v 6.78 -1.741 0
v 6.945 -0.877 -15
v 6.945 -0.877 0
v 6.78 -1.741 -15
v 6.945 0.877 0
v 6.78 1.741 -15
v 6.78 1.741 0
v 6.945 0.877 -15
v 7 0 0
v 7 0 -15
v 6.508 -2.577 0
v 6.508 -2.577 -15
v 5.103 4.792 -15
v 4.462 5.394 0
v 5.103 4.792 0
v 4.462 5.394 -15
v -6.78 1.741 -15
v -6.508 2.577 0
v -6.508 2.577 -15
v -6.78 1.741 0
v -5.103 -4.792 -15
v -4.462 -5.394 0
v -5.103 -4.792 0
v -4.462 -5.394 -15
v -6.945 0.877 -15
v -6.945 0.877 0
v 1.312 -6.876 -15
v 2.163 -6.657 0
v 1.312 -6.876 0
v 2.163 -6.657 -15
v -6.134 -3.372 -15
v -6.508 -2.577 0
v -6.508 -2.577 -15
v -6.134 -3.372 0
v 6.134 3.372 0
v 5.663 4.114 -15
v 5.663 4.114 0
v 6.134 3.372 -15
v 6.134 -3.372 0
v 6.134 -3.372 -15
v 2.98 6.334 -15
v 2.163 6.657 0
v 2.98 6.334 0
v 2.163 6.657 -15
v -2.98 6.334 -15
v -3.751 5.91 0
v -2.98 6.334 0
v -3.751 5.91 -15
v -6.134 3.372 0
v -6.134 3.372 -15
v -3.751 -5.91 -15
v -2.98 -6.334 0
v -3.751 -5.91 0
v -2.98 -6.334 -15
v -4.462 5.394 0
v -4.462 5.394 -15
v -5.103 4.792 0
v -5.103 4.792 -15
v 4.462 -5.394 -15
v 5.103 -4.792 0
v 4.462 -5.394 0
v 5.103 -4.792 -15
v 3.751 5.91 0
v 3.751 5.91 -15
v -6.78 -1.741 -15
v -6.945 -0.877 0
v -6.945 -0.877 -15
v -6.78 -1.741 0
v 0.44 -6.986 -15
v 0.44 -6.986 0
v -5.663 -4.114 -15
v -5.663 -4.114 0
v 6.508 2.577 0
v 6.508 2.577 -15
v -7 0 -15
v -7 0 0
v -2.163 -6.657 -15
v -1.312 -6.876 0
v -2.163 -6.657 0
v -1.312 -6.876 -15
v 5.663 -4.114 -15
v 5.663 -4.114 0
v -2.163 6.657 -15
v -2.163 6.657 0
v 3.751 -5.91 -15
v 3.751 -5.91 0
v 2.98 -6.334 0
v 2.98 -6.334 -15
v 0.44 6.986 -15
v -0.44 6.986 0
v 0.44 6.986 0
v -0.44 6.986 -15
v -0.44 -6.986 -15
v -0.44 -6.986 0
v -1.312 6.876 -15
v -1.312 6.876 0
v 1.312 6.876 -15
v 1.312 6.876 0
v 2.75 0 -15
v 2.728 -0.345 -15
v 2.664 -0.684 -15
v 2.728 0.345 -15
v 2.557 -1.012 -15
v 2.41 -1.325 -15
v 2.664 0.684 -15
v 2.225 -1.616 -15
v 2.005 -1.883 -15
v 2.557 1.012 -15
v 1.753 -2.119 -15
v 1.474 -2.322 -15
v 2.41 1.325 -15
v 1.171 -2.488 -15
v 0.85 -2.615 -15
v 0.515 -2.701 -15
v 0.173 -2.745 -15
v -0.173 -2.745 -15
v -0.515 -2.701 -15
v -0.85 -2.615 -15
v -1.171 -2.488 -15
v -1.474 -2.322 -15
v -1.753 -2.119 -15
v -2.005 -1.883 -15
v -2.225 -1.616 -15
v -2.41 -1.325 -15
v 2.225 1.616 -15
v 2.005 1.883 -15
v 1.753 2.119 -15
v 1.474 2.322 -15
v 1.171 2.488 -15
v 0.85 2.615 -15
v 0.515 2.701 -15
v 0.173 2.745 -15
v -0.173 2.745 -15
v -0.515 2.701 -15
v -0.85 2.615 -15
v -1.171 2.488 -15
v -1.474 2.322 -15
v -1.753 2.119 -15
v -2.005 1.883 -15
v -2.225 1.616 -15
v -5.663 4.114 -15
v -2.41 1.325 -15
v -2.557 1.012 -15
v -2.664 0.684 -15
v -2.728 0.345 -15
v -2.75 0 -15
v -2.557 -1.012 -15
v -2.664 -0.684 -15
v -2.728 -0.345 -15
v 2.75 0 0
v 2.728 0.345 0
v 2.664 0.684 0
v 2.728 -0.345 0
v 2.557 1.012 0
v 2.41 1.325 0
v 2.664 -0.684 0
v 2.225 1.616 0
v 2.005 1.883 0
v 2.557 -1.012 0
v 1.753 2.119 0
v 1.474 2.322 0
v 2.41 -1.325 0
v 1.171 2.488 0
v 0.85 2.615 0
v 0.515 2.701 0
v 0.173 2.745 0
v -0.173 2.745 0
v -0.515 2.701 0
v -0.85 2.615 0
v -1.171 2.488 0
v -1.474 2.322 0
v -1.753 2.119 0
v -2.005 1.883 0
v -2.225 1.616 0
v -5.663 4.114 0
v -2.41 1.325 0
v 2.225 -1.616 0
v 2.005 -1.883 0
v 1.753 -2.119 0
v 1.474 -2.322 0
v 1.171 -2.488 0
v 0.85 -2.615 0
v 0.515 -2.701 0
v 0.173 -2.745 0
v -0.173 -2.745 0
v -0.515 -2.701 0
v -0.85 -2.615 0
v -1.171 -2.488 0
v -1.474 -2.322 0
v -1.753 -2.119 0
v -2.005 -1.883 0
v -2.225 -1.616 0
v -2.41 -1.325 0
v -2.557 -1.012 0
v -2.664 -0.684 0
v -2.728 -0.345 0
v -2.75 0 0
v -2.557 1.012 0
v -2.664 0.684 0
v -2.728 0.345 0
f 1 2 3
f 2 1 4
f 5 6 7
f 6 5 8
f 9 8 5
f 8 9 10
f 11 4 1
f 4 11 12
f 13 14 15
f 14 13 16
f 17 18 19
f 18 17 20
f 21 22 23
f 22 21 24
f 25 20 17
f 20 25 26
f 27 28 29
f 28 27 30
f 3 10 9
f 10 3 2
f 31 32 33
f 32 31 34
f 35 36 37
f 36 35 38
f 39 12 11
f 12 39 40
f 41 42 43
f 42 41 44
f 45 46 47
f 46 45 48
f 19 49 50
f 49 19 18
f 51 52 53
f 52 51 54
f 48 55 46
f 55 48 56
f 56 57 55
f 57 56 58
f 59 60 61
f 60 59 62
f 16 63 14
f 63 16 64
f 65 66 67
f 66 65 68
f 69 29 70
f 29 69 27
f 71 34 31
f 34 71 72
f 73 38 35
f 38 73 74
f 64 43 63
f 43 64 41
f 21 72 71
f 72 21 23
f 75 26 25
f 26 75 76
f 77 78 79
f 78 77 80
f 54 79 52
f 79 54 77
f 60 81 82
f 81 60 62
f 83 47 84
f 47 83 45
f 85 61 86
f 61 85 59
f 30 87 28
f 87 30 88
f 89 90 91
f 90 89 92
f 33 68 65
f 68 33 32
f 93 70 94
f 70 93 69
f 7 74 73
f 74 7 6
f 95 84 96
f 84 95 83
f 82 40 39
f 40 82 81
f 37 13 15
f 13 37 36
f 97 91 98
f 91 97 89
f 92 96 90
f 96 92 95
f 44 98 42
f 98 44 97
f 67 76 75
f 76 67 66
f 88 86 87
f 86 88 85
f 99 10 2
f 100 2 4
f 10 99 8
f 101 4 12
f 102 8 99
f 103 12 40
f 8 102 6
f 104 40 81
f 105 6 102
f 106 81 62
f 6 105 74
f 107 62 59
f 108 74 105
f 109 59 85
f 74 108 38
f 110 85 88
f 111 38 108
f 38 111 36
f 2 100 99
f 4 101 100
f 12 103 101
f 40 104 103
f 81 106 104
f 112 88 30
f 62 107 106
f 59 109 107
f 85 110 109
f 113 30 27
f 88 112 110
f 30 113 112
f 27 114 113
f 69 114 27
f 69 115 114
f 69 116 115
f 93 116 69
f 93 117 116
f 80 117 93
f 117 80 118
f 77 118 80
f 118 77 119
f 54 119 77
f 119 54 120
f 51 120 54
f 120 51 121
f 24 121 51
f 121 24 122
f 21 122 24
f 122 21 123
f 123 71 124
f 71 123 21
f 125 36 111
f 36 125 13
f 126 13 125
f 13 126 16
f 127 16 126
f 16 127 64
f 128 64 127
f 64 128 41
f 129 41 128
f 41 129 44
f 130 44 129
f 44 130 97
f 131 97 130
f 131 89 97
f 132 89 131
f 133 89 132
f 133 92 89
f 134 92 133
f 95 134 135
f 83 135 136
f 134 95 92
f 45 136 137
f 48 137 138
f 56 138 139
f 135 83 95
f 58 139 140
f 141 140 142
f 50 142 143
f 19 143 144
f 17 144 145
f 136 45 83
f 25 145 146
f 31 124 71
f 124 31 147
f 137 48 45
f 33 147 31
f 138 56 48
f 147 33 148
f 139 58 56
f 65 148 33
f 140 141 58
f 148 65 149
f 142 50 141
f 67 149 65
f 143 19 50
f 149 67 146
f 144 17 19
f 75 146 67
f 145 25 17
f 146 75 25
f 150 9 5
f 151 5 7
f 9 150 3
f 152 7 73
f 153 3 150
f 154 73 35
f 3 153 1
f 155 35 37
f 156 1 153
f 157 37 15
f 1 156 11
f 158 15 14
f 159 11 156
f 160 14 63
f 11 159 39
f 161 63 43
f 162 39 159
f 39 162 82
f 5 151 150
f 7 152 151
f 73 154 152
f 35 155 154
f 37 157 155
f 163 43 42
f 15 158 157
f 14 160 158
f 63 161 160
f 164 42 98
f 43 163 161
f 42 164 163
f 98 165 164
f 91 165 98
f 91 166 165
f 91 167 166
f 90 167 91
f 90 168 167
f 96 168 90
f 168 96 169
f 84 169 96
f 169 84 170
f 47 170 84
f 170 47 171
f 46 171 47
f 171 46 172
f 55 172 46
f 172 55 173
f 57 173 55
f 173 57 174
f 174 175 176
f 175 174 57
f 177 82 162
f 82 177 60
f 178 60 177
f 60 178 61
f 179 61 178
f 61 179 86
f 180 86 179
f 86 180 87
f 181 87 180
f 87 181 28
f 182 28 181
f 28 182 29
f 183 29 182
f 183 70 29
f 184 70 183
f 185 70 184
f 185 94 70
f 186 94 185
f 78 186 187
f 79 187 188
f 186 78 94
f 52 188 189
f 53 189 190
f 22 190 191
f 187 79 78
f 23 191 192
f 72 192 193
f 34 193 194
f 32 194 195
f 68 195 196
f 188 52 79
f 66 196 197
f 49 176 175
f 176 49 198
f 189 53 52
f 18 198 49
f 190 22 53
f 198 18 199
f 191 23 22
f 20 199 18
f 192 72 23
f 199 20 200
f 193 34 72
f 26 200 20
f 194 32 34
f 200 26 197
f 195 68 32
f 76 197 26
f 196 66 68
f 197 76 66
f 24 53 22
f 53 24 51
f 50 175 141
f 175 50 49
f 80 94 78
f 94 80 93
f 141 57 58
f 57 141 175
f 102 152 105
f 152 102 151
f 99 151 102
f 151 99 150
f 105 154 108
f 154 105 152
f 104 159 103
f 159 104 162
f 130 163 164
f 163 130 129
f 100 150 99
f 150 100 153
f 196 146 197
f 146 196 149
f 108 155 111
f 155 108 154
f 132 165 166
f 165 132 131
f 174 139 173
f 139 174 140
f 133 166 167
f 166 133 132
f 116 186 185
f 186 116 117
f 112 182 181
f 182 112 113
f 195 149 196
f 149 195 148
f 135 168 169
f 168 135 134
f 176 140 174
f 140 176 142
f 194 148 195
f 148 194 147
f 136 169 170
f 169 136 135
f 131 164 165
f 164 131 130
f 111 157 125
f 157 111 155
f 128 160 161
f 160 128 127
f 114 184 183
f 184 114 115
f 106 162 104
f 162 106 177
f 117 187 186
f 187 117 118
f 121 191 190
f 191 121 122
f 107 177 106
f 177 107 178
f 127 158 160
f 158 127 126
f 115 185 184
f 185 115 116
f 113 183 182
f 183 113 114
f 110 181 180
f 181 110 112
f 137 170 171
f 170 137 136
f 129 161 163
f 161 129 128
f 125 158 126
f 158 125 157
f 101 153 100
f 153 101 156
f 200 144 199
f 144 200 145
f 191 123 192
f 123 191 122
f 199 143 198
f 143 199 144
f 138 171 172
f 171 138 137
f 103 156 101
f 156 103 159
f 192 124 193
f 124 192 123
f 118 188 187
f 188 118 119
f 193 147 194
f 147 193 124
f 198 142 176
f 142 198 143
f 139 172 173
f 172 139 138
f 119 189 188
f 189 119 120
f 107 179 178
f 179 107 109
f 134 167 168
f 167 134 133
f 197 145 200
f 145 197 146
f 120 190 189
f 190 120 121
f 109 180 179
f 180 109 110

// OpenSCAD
$fn = 50;


difference() {
	union() {
		translate(v = [0, 0, -15.0000000000]) {
			cylinder(h = 15, r = 7.0000000000);
		}
		cylinder(h = 0, r = 16.0000000000);
	}
	union() {
		#translate(v = [0, 0, -15]) {
			cylinder(h = 15, r = 2.7500000000);
		}
	}
}
